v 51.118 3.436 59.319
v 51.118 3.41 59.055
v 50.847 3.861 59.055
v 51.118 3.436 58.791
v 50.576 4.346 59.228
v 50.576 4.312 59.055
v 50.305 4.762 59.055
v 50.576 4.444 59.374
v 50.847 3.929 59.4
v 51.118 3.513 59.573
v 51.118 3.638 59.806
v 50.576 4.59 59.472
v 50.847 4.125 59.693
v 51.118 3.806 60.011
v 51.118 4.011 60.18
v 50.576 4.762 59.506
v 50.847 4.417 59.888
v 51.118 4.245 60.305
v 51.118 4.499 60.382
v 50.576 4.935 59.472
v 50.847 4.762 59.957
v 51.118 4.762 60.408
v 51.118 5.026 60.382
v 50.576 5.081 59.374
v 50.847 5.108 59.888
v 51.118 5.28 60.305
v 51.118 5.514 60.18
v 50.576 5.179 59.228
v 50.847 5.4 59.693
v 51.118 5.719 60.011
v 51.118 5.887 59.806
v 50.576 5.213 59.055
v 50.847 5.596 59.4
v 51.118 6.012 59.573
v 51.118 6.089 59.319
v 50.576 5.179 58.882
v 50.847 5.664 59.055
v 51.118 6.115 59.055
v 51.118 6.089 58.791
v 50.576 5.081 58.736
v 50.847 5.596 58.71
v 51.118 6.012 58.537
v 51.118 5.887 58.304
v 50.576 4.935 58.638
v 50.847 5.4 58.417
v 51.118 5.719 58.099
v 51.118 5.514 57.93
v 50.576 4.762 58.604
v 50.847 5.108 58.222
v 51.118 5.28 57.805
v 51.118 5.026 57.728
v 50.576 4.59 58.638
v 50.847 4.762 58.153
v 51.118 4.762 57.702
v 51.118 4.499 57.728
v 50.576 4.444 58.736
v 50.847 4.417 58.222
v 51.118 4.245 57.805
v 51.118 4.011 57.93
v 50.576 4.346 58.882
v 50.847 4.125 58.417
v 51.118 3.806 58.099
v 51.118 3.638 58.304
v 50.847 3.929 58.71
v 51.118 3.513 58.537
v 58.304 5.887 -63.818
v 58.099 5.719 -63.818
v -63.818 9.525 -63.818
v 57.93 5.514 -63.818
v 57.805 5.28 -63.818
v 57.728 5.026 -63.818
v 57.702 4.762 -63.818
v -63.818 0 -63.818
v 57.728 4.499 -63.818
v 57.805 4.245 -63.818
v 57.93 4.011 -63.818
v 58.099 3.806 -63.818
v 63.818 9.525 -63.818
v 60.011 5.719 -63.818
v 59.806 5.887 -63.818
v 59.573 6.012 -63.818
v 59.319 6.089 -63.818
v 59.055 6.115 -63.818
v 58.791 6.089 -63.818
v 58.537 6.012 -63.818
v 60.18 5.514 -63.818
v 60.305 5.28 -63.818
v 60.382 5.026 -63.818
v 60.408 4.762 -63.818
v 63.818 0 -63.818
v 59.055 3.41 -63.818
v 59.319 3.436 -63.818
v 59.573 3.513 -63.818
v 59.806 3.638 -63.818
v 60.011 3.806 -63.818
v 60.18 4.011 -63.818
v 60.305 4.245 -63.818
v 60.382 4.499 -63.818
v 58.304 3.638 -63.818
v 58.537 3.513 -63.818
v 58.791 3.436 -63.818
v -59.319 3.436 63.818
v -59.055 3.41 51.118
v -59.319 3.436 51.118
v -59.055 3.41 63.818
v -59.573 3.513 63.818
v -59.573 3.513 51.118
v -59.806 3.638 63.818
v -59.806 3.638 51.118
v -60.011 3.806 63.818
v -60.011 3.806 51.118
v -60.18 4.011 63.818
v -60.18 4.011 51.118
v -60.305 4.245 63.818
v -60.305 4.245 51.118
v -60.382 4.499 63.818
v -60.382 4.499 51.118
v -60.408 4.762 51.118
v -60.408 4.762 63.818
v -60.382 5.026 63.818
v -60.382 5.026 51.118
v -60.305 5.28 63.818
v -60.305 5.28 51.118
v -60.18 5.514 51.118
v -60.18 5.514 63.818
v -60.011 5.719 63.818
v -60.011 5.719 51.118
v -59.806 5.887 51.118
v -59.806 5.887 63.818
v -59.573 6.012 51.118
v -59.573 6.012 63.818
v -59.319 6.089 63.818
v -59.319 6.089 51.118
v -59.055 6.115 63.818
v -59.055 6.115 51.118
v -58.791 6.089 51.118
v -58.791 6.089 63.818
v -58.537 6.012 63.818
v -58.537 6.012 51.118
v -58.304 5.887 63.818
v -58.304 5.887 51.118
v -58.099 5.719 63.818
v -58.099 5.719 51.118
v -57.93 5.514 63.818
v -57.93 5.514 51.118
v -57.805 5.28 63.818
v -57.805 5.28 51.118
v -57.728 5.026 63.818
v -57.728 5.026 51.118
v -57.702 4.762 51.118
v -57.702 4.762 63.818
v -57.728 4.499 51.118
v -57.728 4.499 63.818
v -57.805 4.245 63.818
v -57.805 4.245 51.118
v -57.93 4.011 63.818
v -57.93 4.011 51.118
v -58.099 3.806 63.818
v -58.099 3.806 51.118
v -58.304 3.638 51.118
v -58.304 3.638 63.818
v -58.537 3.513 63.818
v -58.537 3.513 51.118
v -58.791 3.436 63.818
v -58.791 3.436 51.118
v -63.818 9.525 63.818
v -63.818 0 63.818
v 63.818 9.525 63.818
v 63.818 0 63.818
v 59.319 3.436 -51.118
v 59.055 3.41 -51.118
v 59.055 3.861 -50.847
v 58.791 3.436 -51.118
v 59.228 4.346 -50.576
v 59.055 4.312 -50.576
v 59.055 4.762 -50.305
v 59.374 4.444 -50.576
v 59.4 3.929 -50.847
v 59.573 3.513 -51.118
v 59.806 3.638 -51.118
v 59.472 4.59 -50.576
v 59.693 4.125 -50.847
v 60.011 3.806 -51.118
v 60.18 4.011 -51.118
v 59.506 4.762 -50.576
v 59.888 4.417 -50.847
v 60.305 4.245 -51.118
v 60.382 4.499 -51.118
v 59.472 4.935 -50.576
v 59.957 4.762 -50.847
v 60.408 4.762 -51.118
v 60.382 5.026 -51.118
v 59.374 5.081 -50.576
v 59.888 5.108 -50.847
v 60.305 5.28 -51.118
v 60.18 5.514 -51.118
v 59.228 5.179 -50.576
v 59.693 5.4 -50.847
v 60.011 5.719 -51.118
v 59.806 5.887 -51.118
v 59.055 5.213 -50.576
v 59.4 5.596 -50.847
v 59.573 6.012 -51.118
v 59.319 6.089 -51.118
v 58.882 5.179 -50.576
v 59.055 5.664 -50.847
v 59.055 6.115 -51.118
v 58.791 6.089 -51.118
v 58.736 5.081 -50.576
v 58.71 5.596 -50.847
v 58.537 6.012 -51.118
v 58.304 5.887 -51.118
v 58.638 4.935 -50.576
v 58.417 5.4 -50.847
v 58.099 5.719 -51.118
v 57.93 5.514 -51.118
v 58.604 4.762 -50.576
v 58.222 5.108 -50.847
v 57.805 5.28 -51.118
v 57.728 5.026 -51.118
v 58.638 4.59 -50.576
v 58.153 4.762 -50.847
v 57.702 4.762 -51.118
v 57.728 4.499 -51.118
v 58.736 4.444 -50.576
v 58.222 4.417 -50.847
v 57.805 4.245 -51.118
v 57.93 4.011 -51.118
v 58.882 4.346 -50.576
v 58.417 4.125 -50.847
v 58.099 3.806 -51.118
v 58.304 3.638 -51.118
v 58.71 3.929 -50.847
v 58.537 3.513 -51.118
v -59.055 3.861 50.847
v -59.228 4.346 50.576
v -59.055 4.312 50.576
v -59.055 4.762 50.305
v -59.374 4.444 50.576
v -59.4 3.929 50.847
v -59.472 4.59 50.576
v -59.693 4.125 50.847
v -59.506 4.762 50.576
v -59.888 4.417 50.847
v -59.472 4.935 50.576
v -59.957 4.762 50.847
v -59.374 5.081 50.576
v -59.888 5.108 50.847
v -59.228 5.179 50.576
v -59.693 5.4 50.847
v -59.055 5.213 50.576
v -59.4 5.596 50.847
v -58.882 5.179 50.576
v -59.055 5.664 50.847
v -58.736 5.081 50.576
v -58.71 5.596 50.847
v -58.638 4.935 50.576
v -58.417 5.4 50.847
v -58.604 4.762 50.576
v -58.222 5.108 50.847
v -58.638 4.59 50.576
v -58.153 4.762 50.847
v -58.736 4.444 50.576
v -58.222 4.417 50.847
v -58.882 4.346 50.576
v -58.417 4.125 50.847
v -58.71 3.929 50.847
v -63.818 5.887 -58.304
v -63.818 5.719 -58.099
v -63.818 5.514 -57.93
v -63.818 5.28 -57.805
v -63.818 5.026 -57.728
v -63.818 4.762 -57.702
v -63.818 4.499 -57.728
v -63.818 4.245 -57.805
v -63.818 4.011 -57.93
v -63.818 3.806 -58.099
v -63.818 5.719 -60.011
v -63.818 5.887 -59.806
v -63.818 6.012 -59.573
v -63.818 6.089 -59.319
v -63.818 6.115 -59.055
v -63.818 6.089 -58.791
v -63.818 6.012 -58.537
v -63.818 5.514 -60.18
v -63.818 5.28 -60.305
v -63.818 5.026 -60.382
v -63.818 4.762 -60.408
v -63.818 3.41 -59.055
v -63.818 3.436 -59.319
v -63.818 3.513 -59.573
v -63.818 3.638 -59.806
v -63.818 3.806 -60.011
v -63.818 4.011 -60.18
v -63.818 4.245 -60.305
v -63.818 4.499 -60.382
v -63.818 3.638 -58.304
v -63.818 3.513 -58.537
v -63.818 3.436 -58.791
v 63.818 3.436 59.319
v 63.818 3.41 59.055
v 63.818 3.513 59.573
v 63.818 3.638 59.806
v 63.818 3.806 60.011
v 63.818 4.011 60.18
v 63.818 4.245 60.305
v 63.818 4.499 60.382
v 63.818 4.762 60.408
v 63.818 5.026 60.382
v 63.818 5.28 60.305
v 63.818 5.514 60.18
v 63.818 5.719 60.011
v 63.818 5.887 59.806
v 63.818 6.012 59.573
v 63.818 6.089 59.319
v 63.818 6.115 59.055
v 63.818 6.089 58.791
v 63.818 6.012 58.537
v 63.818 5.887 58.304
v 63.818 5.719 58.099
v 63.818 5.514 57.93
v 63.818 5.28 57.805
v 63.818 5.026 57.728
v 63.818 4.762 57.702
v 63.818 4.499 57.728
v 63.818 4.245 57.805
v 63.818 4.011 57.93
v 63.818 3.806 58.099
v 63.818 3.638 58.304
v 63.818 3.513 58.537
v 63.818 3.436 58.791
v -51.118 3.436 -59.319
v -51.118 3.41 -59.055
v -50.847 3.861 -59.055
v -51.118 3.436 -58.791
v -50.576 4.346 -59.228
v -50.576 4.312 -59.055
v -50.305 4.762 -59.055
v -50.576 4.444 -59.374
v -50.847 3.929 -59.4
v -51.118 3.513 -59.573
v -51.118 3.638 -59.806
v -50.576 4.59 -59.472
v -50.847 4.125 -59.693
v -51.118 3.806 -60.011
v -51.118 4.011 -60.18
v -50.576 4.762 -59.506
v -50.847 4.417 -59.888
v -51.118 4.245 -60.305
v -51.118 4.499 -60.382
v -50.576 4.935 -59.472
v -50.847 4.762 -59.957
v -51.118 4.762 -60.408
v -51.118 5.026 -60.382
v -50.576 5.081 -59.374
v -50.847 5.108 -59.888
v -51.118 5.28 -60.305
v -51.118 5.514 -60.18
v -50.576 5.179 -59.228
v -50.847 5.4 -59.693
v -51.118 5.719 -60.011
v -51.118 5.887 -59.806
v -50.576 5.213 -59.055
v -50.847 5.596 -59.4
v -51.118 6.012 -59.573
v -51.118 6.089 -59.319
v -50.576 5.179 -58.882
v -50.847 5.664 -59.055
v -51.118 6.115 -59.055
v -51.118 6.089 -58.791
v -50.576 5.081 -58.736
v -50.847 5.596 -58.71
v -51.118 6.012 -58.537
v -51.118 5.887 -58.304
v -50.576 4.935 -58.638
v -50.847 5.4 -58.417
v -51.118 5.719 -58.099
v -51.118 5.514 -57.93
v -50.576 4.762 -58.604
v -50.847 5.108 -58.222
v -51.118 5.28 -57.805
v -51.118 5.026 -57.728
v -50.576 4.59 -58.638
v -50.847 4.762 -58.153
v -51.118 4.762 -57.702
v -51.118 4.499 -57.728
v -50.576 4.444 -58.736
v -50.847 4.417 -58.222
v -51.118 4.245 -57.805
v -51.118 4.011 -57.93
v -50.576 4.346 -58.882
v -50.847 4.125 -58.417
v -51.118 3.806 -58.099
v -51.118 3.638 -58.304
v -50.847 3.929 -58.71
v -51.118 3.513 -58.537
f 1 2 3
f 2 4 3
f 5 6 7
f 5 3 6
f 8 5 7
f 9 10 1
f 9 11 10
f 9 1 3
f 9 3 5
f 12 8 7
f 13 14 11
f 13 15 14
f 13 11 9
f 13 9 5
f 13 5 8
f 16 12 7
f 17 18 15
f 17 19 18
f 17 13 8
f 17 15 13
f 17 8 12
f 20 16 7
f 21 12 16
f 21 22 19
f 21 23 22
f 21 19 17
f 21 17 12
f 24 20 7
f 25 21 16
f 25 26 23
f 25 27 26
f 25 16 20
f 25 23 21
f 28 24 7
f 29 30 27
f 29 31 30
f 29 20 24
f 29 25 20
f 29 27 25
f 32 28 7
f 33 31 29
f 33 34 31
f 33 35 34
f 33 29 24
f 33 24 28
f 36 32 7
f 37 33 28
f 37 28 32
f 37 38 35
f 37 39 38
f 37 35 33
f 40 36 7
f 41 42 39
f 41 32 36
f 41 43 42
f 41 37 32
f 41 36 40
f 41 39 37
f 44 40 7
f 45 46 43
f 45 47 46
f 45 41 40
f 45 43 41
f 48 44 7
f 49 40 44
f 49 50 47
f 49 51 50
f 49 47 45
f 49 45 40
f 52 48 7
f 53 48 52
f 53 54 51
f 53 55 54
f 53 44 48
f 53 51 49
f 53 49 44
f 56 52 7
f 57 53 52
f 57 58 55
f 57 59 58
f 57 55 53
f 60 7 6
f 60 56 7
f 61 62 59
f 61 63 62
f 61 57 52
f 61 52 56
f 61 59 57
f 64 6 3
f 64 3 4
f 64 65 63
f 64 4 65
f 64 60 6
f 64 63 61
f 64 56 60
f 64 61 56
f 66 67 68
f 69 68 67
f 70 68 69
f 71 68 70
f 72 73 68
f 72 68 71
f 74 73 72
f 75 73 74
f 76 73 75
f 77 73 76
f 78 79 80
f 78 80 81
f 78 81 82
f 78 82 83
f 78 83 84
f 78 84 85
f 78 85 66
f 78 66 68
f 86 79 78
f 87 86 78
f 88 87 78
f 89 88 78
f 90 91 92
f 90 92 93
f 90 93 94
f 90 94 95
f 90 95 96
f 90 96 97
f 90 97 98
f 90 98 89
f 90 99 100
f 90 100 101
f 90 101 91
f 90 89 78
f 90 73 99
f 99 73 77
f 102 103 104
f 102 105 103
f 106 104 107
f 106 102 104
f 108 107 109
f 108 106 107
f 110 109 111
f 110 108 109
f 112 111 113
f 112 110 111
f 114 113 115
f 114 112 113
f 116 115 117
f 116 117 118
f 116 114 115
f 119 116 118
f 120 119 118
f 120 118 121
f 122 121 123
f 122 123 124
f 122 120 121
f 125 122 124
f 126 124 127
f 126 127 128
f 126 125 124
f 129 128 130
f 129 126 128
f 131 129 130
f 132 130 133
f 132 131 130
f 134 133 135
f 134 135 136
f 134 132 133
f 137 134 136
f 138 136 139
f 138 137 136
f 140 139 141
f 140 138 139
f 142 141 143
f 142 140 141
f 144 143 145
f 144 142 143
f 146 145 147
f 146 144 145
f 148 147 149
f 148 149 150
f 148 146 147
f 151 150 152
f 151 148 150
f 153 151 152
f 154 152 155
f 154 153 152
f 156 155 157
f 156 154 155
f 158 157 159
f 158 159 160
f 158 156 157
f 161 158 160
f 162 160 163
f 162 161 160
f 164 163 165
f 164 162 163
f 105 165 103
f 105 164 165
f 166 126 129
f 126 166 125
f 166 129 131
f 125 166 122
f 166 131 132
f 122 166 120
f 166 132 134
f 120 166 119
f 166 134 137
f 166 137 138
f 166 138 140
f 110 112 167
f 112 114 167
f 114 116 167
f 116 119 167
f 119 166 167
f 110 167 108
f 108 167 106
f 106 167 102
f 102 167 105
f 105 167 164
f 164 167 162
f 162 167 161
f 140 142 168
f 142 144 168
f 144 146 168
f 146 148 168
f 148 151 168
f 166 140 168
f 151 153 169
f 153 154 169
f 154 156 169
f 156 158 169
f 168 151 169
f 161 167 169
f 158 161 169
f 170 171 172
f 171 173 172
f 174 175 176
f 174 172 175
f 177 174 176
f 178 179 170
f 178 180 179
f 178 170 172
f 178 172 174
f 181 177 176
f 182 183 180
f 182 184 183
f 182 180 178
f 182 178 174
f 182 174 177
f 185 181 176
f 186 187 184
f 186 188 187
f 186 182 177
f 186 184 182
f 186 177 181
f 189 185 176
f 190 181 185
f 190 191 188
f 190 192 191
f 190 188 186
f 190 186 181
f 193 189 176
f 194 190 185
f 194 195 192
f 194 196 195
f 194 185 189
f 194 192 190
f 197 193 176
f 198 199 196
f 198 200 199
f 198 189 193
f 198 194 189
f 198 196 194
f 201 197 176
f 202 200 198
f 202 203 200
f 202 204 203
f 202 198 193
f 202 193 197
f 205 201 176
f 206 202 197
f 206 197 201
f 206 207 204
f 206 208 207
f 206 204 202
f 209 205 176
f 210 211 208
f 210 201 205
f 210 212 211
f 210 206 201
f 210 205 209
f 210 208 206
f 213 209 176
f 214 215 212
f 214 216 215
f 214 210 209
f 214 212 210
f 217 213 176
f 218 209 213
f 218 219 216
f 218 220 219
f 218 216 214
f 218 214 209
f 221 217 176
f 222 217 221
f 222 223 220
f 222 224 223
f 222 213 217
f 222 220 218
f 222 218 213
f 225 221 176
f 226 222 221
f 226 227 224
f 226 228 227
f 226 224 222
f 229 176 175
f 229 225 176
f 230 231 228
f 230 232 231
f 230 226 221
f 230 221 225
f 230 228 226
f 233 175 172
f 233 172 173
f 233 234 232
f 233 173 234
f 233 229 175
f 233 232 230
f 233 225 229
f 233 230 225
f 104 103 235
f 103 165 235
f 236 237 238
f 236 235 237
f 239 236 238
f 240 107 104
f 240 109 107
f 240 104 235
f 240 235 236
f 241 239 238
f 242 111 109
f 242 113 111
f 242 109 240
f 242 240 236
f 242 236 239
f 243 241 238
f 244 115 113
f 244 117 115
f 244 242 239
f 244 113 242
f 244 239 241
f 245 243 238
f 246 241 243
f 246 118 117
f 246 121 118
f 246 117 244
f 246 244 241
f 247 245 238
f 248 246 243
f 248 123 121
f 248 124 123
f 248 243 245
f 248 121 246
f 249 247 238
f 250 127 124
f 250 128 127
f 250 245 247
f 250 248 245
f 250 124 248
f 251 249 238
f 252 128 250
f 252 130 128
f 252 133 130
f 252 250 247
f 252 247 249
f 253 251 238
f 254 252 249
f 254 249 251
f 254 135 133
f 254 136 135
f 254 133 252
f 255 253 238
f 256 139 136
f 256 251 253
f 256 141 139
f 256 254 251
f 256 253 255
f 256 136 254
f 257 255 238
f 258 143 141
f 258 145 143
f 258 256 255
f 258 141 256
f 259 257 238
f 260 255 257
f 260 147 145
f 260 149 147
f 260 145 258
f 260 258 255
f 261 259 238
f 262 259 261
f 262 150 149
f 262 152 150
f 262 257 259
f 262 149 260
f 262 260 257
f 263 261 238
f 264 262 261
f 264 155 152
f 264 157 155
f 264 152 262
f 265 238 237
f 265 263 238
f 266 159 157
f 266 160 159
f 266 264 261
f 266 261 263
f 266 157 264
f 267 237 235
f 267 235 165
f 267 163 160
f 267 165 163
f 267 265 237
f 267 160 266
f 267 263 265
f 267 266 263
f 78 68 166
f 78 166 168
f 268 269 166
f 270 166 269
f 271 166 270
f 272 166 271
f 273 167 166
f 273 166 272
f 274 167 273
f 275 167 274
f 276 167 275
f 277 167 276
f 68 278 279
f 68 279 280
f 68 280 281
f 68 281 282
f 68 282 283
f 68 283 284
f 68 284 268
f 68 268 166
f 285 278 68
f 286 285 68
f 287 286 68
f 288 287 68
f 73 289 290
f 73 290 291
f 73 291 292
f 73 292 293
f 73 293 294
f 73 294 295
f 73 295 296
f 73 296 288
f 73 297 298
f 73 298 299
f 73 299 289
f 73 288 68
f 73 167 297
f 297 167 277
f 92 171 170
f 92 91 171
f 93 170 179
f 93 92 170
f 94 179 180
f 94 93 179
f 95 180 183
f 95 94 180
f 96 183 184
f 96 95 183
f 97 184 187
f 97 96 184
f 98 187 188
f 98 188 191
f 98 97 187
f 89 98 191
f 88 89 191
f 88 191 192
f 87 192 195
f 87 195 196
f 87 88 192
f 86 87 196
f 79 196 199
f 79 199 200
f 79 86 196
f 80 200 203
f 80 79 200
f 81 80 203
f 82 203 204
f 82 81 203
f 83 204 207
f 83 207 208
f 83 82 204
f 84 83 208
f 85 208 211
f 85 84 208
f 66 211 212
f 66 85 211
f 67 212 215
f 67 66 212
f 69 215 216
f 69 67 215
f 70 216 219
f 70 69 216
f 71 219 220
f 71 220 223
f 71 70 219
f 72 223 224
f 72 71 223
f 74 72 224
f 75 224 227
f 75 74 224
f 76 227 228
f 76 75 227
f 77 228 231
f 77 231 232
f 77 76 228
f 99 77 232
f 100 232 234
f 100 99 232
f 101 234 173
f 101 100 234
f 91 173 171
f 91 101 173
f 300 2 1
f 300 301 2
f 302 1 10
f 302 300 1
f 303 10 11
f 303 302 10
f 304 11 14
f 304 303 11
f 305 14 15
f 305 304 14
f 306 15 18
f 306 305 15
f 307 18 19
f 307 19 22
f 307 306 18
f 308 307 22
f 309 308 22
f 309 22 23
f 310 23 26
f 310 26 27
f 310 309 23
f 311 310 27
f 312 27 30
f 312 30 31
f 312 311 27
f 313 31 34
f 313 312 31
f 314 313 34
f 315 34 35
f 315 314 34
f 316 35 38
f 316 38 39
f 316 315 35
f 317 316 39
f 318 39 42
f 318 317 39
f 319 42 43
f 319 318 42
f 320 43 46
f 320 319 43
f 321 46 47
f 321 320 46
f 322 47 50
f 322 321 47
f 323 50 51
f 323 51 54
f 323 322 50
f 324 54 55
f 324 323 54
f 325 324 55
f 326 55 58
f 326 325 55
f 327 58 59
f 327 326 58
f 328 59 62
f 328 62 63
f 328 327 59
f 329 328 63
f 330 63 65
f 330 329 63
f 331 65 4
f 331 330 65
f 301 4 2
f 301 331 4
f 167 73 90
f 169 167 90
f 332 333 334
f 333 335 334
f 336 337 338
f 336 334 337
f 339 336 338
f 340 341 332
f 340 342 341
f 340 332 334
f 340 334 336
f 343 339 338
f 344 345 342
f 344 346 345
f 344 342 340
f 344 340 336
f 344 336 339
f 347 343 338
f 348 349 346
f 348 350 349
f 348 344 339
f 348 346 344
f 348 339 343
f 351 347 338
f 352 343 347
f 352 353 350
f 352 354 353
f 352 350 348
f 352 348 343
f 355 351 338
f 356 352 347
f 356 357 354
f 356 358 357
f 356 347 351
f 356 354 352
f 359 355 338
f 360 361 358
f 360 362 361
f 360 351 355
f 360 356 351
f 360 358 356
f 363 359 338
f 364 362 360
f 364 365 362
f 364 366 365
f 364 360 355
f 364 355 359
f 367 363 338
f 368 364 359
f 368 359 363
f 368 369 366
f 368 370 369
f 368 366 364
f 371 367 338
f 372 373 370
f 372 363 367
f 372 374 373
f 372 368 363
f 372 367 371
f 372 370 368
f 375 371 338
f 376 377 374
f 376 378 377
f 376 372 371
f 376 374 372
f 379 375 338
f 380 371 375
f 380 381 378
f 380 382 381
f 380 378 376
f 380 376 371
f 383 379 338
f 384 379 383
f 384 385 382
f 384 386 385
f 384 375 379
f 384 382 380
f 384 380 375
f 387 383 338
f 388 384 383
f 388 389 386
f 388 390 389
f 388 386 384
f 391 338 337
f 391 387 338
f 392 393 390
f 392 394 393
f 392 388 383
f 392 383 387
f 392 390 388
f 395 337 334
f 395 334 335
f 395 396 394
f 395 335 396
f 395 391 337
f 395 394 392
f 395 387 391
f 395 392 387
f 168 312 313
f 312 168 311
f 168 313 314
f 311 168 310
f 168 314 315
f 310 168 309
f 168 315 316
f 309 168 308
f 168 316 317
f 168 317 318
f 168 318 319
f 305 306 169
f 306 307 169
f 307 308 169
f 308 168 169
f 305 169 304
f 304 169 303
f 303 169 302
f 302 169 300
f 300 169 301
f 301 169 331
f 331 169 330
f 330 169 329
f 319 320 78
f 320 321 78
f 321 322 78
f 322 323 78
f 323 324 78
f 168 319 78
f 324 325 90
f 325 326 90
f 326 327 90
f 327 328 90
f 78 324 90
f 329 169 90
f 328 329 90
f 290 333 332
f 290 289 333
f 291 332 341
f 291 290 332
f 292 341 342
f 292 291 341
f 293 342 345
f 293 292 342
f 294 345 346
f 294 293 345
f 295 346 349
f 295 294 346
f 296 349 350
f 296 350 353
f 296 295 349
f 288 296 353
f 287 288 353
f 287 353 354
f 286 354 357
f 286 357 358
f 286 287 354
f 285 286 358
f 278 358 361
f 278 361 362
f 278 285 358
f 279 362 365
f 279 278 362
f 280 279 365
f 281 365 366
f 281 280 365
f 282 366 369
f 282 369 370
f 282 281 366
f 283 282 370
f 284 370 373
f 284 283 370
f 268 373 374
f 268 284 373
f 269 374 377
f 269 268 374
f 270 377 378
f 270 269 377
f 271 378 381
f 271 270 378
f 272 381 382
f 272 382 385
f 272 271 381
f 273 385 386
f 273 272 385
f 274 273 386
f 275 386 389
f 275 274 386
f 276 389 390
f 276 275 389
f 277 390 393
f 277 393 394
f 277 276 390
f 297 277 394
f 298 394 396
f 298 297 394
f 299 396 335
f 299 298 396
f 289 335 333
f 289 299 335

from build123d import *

# Parameters (mm, degrees)
SKETCH1_W           = 127.635
SKETCH1_H           = 127.635
BOSS_EXTRUDE1_DEPTH = 9.525
CIRPATTERN1_COUNT   = 4


with BuildPart() as part:
    # Sketch1 → Boss-Extrude1 (new body)
    with BuildSketch(Plane(origin=(0, 0, 0), x_dir=(1, 0, 0), z_dir=(0, 1, 0))):
        Rectangle(SKETCH1_W, SKETCH1_H)
    extrude(amount=BOSS_EXTRUDE1_DEPTH)

    # Sketch8 → Tap Drill for #6-32 Tap1 (revolve, cut)
    with BuildSketch(Plane(origin=(-59.055, 4.7625, 63.8175), x_dir=(0, -1, 0), z_dir=(1, 0, 0))):
        Polygon((0, 0), (0, 13.51269403), (1.35255, 12.7), (1.35255, 0), align=None)
    tap_drill_for_6_32_tap1 = revolve(axis=Axis((-59.055, 4.7625, 70.1675), (0, 0, -1)), mode=Mode.SUBTRACT)

    # CirPattern1: Tap Drill for #6-32 Tap1 ×4 about axis
    cirpattern1_axis = Axis((0, 9.525, 0), (0, -1, 0))
    for i in range(1, CIRPATTERN1_COUNT):
        add(tap_drill_for_6_32_tap1.rotate(cirpattern1_axis, i * 360 / CIRPATTERN1_COUNT), mode=Mode.SUBTRACT)


solid = part.part
